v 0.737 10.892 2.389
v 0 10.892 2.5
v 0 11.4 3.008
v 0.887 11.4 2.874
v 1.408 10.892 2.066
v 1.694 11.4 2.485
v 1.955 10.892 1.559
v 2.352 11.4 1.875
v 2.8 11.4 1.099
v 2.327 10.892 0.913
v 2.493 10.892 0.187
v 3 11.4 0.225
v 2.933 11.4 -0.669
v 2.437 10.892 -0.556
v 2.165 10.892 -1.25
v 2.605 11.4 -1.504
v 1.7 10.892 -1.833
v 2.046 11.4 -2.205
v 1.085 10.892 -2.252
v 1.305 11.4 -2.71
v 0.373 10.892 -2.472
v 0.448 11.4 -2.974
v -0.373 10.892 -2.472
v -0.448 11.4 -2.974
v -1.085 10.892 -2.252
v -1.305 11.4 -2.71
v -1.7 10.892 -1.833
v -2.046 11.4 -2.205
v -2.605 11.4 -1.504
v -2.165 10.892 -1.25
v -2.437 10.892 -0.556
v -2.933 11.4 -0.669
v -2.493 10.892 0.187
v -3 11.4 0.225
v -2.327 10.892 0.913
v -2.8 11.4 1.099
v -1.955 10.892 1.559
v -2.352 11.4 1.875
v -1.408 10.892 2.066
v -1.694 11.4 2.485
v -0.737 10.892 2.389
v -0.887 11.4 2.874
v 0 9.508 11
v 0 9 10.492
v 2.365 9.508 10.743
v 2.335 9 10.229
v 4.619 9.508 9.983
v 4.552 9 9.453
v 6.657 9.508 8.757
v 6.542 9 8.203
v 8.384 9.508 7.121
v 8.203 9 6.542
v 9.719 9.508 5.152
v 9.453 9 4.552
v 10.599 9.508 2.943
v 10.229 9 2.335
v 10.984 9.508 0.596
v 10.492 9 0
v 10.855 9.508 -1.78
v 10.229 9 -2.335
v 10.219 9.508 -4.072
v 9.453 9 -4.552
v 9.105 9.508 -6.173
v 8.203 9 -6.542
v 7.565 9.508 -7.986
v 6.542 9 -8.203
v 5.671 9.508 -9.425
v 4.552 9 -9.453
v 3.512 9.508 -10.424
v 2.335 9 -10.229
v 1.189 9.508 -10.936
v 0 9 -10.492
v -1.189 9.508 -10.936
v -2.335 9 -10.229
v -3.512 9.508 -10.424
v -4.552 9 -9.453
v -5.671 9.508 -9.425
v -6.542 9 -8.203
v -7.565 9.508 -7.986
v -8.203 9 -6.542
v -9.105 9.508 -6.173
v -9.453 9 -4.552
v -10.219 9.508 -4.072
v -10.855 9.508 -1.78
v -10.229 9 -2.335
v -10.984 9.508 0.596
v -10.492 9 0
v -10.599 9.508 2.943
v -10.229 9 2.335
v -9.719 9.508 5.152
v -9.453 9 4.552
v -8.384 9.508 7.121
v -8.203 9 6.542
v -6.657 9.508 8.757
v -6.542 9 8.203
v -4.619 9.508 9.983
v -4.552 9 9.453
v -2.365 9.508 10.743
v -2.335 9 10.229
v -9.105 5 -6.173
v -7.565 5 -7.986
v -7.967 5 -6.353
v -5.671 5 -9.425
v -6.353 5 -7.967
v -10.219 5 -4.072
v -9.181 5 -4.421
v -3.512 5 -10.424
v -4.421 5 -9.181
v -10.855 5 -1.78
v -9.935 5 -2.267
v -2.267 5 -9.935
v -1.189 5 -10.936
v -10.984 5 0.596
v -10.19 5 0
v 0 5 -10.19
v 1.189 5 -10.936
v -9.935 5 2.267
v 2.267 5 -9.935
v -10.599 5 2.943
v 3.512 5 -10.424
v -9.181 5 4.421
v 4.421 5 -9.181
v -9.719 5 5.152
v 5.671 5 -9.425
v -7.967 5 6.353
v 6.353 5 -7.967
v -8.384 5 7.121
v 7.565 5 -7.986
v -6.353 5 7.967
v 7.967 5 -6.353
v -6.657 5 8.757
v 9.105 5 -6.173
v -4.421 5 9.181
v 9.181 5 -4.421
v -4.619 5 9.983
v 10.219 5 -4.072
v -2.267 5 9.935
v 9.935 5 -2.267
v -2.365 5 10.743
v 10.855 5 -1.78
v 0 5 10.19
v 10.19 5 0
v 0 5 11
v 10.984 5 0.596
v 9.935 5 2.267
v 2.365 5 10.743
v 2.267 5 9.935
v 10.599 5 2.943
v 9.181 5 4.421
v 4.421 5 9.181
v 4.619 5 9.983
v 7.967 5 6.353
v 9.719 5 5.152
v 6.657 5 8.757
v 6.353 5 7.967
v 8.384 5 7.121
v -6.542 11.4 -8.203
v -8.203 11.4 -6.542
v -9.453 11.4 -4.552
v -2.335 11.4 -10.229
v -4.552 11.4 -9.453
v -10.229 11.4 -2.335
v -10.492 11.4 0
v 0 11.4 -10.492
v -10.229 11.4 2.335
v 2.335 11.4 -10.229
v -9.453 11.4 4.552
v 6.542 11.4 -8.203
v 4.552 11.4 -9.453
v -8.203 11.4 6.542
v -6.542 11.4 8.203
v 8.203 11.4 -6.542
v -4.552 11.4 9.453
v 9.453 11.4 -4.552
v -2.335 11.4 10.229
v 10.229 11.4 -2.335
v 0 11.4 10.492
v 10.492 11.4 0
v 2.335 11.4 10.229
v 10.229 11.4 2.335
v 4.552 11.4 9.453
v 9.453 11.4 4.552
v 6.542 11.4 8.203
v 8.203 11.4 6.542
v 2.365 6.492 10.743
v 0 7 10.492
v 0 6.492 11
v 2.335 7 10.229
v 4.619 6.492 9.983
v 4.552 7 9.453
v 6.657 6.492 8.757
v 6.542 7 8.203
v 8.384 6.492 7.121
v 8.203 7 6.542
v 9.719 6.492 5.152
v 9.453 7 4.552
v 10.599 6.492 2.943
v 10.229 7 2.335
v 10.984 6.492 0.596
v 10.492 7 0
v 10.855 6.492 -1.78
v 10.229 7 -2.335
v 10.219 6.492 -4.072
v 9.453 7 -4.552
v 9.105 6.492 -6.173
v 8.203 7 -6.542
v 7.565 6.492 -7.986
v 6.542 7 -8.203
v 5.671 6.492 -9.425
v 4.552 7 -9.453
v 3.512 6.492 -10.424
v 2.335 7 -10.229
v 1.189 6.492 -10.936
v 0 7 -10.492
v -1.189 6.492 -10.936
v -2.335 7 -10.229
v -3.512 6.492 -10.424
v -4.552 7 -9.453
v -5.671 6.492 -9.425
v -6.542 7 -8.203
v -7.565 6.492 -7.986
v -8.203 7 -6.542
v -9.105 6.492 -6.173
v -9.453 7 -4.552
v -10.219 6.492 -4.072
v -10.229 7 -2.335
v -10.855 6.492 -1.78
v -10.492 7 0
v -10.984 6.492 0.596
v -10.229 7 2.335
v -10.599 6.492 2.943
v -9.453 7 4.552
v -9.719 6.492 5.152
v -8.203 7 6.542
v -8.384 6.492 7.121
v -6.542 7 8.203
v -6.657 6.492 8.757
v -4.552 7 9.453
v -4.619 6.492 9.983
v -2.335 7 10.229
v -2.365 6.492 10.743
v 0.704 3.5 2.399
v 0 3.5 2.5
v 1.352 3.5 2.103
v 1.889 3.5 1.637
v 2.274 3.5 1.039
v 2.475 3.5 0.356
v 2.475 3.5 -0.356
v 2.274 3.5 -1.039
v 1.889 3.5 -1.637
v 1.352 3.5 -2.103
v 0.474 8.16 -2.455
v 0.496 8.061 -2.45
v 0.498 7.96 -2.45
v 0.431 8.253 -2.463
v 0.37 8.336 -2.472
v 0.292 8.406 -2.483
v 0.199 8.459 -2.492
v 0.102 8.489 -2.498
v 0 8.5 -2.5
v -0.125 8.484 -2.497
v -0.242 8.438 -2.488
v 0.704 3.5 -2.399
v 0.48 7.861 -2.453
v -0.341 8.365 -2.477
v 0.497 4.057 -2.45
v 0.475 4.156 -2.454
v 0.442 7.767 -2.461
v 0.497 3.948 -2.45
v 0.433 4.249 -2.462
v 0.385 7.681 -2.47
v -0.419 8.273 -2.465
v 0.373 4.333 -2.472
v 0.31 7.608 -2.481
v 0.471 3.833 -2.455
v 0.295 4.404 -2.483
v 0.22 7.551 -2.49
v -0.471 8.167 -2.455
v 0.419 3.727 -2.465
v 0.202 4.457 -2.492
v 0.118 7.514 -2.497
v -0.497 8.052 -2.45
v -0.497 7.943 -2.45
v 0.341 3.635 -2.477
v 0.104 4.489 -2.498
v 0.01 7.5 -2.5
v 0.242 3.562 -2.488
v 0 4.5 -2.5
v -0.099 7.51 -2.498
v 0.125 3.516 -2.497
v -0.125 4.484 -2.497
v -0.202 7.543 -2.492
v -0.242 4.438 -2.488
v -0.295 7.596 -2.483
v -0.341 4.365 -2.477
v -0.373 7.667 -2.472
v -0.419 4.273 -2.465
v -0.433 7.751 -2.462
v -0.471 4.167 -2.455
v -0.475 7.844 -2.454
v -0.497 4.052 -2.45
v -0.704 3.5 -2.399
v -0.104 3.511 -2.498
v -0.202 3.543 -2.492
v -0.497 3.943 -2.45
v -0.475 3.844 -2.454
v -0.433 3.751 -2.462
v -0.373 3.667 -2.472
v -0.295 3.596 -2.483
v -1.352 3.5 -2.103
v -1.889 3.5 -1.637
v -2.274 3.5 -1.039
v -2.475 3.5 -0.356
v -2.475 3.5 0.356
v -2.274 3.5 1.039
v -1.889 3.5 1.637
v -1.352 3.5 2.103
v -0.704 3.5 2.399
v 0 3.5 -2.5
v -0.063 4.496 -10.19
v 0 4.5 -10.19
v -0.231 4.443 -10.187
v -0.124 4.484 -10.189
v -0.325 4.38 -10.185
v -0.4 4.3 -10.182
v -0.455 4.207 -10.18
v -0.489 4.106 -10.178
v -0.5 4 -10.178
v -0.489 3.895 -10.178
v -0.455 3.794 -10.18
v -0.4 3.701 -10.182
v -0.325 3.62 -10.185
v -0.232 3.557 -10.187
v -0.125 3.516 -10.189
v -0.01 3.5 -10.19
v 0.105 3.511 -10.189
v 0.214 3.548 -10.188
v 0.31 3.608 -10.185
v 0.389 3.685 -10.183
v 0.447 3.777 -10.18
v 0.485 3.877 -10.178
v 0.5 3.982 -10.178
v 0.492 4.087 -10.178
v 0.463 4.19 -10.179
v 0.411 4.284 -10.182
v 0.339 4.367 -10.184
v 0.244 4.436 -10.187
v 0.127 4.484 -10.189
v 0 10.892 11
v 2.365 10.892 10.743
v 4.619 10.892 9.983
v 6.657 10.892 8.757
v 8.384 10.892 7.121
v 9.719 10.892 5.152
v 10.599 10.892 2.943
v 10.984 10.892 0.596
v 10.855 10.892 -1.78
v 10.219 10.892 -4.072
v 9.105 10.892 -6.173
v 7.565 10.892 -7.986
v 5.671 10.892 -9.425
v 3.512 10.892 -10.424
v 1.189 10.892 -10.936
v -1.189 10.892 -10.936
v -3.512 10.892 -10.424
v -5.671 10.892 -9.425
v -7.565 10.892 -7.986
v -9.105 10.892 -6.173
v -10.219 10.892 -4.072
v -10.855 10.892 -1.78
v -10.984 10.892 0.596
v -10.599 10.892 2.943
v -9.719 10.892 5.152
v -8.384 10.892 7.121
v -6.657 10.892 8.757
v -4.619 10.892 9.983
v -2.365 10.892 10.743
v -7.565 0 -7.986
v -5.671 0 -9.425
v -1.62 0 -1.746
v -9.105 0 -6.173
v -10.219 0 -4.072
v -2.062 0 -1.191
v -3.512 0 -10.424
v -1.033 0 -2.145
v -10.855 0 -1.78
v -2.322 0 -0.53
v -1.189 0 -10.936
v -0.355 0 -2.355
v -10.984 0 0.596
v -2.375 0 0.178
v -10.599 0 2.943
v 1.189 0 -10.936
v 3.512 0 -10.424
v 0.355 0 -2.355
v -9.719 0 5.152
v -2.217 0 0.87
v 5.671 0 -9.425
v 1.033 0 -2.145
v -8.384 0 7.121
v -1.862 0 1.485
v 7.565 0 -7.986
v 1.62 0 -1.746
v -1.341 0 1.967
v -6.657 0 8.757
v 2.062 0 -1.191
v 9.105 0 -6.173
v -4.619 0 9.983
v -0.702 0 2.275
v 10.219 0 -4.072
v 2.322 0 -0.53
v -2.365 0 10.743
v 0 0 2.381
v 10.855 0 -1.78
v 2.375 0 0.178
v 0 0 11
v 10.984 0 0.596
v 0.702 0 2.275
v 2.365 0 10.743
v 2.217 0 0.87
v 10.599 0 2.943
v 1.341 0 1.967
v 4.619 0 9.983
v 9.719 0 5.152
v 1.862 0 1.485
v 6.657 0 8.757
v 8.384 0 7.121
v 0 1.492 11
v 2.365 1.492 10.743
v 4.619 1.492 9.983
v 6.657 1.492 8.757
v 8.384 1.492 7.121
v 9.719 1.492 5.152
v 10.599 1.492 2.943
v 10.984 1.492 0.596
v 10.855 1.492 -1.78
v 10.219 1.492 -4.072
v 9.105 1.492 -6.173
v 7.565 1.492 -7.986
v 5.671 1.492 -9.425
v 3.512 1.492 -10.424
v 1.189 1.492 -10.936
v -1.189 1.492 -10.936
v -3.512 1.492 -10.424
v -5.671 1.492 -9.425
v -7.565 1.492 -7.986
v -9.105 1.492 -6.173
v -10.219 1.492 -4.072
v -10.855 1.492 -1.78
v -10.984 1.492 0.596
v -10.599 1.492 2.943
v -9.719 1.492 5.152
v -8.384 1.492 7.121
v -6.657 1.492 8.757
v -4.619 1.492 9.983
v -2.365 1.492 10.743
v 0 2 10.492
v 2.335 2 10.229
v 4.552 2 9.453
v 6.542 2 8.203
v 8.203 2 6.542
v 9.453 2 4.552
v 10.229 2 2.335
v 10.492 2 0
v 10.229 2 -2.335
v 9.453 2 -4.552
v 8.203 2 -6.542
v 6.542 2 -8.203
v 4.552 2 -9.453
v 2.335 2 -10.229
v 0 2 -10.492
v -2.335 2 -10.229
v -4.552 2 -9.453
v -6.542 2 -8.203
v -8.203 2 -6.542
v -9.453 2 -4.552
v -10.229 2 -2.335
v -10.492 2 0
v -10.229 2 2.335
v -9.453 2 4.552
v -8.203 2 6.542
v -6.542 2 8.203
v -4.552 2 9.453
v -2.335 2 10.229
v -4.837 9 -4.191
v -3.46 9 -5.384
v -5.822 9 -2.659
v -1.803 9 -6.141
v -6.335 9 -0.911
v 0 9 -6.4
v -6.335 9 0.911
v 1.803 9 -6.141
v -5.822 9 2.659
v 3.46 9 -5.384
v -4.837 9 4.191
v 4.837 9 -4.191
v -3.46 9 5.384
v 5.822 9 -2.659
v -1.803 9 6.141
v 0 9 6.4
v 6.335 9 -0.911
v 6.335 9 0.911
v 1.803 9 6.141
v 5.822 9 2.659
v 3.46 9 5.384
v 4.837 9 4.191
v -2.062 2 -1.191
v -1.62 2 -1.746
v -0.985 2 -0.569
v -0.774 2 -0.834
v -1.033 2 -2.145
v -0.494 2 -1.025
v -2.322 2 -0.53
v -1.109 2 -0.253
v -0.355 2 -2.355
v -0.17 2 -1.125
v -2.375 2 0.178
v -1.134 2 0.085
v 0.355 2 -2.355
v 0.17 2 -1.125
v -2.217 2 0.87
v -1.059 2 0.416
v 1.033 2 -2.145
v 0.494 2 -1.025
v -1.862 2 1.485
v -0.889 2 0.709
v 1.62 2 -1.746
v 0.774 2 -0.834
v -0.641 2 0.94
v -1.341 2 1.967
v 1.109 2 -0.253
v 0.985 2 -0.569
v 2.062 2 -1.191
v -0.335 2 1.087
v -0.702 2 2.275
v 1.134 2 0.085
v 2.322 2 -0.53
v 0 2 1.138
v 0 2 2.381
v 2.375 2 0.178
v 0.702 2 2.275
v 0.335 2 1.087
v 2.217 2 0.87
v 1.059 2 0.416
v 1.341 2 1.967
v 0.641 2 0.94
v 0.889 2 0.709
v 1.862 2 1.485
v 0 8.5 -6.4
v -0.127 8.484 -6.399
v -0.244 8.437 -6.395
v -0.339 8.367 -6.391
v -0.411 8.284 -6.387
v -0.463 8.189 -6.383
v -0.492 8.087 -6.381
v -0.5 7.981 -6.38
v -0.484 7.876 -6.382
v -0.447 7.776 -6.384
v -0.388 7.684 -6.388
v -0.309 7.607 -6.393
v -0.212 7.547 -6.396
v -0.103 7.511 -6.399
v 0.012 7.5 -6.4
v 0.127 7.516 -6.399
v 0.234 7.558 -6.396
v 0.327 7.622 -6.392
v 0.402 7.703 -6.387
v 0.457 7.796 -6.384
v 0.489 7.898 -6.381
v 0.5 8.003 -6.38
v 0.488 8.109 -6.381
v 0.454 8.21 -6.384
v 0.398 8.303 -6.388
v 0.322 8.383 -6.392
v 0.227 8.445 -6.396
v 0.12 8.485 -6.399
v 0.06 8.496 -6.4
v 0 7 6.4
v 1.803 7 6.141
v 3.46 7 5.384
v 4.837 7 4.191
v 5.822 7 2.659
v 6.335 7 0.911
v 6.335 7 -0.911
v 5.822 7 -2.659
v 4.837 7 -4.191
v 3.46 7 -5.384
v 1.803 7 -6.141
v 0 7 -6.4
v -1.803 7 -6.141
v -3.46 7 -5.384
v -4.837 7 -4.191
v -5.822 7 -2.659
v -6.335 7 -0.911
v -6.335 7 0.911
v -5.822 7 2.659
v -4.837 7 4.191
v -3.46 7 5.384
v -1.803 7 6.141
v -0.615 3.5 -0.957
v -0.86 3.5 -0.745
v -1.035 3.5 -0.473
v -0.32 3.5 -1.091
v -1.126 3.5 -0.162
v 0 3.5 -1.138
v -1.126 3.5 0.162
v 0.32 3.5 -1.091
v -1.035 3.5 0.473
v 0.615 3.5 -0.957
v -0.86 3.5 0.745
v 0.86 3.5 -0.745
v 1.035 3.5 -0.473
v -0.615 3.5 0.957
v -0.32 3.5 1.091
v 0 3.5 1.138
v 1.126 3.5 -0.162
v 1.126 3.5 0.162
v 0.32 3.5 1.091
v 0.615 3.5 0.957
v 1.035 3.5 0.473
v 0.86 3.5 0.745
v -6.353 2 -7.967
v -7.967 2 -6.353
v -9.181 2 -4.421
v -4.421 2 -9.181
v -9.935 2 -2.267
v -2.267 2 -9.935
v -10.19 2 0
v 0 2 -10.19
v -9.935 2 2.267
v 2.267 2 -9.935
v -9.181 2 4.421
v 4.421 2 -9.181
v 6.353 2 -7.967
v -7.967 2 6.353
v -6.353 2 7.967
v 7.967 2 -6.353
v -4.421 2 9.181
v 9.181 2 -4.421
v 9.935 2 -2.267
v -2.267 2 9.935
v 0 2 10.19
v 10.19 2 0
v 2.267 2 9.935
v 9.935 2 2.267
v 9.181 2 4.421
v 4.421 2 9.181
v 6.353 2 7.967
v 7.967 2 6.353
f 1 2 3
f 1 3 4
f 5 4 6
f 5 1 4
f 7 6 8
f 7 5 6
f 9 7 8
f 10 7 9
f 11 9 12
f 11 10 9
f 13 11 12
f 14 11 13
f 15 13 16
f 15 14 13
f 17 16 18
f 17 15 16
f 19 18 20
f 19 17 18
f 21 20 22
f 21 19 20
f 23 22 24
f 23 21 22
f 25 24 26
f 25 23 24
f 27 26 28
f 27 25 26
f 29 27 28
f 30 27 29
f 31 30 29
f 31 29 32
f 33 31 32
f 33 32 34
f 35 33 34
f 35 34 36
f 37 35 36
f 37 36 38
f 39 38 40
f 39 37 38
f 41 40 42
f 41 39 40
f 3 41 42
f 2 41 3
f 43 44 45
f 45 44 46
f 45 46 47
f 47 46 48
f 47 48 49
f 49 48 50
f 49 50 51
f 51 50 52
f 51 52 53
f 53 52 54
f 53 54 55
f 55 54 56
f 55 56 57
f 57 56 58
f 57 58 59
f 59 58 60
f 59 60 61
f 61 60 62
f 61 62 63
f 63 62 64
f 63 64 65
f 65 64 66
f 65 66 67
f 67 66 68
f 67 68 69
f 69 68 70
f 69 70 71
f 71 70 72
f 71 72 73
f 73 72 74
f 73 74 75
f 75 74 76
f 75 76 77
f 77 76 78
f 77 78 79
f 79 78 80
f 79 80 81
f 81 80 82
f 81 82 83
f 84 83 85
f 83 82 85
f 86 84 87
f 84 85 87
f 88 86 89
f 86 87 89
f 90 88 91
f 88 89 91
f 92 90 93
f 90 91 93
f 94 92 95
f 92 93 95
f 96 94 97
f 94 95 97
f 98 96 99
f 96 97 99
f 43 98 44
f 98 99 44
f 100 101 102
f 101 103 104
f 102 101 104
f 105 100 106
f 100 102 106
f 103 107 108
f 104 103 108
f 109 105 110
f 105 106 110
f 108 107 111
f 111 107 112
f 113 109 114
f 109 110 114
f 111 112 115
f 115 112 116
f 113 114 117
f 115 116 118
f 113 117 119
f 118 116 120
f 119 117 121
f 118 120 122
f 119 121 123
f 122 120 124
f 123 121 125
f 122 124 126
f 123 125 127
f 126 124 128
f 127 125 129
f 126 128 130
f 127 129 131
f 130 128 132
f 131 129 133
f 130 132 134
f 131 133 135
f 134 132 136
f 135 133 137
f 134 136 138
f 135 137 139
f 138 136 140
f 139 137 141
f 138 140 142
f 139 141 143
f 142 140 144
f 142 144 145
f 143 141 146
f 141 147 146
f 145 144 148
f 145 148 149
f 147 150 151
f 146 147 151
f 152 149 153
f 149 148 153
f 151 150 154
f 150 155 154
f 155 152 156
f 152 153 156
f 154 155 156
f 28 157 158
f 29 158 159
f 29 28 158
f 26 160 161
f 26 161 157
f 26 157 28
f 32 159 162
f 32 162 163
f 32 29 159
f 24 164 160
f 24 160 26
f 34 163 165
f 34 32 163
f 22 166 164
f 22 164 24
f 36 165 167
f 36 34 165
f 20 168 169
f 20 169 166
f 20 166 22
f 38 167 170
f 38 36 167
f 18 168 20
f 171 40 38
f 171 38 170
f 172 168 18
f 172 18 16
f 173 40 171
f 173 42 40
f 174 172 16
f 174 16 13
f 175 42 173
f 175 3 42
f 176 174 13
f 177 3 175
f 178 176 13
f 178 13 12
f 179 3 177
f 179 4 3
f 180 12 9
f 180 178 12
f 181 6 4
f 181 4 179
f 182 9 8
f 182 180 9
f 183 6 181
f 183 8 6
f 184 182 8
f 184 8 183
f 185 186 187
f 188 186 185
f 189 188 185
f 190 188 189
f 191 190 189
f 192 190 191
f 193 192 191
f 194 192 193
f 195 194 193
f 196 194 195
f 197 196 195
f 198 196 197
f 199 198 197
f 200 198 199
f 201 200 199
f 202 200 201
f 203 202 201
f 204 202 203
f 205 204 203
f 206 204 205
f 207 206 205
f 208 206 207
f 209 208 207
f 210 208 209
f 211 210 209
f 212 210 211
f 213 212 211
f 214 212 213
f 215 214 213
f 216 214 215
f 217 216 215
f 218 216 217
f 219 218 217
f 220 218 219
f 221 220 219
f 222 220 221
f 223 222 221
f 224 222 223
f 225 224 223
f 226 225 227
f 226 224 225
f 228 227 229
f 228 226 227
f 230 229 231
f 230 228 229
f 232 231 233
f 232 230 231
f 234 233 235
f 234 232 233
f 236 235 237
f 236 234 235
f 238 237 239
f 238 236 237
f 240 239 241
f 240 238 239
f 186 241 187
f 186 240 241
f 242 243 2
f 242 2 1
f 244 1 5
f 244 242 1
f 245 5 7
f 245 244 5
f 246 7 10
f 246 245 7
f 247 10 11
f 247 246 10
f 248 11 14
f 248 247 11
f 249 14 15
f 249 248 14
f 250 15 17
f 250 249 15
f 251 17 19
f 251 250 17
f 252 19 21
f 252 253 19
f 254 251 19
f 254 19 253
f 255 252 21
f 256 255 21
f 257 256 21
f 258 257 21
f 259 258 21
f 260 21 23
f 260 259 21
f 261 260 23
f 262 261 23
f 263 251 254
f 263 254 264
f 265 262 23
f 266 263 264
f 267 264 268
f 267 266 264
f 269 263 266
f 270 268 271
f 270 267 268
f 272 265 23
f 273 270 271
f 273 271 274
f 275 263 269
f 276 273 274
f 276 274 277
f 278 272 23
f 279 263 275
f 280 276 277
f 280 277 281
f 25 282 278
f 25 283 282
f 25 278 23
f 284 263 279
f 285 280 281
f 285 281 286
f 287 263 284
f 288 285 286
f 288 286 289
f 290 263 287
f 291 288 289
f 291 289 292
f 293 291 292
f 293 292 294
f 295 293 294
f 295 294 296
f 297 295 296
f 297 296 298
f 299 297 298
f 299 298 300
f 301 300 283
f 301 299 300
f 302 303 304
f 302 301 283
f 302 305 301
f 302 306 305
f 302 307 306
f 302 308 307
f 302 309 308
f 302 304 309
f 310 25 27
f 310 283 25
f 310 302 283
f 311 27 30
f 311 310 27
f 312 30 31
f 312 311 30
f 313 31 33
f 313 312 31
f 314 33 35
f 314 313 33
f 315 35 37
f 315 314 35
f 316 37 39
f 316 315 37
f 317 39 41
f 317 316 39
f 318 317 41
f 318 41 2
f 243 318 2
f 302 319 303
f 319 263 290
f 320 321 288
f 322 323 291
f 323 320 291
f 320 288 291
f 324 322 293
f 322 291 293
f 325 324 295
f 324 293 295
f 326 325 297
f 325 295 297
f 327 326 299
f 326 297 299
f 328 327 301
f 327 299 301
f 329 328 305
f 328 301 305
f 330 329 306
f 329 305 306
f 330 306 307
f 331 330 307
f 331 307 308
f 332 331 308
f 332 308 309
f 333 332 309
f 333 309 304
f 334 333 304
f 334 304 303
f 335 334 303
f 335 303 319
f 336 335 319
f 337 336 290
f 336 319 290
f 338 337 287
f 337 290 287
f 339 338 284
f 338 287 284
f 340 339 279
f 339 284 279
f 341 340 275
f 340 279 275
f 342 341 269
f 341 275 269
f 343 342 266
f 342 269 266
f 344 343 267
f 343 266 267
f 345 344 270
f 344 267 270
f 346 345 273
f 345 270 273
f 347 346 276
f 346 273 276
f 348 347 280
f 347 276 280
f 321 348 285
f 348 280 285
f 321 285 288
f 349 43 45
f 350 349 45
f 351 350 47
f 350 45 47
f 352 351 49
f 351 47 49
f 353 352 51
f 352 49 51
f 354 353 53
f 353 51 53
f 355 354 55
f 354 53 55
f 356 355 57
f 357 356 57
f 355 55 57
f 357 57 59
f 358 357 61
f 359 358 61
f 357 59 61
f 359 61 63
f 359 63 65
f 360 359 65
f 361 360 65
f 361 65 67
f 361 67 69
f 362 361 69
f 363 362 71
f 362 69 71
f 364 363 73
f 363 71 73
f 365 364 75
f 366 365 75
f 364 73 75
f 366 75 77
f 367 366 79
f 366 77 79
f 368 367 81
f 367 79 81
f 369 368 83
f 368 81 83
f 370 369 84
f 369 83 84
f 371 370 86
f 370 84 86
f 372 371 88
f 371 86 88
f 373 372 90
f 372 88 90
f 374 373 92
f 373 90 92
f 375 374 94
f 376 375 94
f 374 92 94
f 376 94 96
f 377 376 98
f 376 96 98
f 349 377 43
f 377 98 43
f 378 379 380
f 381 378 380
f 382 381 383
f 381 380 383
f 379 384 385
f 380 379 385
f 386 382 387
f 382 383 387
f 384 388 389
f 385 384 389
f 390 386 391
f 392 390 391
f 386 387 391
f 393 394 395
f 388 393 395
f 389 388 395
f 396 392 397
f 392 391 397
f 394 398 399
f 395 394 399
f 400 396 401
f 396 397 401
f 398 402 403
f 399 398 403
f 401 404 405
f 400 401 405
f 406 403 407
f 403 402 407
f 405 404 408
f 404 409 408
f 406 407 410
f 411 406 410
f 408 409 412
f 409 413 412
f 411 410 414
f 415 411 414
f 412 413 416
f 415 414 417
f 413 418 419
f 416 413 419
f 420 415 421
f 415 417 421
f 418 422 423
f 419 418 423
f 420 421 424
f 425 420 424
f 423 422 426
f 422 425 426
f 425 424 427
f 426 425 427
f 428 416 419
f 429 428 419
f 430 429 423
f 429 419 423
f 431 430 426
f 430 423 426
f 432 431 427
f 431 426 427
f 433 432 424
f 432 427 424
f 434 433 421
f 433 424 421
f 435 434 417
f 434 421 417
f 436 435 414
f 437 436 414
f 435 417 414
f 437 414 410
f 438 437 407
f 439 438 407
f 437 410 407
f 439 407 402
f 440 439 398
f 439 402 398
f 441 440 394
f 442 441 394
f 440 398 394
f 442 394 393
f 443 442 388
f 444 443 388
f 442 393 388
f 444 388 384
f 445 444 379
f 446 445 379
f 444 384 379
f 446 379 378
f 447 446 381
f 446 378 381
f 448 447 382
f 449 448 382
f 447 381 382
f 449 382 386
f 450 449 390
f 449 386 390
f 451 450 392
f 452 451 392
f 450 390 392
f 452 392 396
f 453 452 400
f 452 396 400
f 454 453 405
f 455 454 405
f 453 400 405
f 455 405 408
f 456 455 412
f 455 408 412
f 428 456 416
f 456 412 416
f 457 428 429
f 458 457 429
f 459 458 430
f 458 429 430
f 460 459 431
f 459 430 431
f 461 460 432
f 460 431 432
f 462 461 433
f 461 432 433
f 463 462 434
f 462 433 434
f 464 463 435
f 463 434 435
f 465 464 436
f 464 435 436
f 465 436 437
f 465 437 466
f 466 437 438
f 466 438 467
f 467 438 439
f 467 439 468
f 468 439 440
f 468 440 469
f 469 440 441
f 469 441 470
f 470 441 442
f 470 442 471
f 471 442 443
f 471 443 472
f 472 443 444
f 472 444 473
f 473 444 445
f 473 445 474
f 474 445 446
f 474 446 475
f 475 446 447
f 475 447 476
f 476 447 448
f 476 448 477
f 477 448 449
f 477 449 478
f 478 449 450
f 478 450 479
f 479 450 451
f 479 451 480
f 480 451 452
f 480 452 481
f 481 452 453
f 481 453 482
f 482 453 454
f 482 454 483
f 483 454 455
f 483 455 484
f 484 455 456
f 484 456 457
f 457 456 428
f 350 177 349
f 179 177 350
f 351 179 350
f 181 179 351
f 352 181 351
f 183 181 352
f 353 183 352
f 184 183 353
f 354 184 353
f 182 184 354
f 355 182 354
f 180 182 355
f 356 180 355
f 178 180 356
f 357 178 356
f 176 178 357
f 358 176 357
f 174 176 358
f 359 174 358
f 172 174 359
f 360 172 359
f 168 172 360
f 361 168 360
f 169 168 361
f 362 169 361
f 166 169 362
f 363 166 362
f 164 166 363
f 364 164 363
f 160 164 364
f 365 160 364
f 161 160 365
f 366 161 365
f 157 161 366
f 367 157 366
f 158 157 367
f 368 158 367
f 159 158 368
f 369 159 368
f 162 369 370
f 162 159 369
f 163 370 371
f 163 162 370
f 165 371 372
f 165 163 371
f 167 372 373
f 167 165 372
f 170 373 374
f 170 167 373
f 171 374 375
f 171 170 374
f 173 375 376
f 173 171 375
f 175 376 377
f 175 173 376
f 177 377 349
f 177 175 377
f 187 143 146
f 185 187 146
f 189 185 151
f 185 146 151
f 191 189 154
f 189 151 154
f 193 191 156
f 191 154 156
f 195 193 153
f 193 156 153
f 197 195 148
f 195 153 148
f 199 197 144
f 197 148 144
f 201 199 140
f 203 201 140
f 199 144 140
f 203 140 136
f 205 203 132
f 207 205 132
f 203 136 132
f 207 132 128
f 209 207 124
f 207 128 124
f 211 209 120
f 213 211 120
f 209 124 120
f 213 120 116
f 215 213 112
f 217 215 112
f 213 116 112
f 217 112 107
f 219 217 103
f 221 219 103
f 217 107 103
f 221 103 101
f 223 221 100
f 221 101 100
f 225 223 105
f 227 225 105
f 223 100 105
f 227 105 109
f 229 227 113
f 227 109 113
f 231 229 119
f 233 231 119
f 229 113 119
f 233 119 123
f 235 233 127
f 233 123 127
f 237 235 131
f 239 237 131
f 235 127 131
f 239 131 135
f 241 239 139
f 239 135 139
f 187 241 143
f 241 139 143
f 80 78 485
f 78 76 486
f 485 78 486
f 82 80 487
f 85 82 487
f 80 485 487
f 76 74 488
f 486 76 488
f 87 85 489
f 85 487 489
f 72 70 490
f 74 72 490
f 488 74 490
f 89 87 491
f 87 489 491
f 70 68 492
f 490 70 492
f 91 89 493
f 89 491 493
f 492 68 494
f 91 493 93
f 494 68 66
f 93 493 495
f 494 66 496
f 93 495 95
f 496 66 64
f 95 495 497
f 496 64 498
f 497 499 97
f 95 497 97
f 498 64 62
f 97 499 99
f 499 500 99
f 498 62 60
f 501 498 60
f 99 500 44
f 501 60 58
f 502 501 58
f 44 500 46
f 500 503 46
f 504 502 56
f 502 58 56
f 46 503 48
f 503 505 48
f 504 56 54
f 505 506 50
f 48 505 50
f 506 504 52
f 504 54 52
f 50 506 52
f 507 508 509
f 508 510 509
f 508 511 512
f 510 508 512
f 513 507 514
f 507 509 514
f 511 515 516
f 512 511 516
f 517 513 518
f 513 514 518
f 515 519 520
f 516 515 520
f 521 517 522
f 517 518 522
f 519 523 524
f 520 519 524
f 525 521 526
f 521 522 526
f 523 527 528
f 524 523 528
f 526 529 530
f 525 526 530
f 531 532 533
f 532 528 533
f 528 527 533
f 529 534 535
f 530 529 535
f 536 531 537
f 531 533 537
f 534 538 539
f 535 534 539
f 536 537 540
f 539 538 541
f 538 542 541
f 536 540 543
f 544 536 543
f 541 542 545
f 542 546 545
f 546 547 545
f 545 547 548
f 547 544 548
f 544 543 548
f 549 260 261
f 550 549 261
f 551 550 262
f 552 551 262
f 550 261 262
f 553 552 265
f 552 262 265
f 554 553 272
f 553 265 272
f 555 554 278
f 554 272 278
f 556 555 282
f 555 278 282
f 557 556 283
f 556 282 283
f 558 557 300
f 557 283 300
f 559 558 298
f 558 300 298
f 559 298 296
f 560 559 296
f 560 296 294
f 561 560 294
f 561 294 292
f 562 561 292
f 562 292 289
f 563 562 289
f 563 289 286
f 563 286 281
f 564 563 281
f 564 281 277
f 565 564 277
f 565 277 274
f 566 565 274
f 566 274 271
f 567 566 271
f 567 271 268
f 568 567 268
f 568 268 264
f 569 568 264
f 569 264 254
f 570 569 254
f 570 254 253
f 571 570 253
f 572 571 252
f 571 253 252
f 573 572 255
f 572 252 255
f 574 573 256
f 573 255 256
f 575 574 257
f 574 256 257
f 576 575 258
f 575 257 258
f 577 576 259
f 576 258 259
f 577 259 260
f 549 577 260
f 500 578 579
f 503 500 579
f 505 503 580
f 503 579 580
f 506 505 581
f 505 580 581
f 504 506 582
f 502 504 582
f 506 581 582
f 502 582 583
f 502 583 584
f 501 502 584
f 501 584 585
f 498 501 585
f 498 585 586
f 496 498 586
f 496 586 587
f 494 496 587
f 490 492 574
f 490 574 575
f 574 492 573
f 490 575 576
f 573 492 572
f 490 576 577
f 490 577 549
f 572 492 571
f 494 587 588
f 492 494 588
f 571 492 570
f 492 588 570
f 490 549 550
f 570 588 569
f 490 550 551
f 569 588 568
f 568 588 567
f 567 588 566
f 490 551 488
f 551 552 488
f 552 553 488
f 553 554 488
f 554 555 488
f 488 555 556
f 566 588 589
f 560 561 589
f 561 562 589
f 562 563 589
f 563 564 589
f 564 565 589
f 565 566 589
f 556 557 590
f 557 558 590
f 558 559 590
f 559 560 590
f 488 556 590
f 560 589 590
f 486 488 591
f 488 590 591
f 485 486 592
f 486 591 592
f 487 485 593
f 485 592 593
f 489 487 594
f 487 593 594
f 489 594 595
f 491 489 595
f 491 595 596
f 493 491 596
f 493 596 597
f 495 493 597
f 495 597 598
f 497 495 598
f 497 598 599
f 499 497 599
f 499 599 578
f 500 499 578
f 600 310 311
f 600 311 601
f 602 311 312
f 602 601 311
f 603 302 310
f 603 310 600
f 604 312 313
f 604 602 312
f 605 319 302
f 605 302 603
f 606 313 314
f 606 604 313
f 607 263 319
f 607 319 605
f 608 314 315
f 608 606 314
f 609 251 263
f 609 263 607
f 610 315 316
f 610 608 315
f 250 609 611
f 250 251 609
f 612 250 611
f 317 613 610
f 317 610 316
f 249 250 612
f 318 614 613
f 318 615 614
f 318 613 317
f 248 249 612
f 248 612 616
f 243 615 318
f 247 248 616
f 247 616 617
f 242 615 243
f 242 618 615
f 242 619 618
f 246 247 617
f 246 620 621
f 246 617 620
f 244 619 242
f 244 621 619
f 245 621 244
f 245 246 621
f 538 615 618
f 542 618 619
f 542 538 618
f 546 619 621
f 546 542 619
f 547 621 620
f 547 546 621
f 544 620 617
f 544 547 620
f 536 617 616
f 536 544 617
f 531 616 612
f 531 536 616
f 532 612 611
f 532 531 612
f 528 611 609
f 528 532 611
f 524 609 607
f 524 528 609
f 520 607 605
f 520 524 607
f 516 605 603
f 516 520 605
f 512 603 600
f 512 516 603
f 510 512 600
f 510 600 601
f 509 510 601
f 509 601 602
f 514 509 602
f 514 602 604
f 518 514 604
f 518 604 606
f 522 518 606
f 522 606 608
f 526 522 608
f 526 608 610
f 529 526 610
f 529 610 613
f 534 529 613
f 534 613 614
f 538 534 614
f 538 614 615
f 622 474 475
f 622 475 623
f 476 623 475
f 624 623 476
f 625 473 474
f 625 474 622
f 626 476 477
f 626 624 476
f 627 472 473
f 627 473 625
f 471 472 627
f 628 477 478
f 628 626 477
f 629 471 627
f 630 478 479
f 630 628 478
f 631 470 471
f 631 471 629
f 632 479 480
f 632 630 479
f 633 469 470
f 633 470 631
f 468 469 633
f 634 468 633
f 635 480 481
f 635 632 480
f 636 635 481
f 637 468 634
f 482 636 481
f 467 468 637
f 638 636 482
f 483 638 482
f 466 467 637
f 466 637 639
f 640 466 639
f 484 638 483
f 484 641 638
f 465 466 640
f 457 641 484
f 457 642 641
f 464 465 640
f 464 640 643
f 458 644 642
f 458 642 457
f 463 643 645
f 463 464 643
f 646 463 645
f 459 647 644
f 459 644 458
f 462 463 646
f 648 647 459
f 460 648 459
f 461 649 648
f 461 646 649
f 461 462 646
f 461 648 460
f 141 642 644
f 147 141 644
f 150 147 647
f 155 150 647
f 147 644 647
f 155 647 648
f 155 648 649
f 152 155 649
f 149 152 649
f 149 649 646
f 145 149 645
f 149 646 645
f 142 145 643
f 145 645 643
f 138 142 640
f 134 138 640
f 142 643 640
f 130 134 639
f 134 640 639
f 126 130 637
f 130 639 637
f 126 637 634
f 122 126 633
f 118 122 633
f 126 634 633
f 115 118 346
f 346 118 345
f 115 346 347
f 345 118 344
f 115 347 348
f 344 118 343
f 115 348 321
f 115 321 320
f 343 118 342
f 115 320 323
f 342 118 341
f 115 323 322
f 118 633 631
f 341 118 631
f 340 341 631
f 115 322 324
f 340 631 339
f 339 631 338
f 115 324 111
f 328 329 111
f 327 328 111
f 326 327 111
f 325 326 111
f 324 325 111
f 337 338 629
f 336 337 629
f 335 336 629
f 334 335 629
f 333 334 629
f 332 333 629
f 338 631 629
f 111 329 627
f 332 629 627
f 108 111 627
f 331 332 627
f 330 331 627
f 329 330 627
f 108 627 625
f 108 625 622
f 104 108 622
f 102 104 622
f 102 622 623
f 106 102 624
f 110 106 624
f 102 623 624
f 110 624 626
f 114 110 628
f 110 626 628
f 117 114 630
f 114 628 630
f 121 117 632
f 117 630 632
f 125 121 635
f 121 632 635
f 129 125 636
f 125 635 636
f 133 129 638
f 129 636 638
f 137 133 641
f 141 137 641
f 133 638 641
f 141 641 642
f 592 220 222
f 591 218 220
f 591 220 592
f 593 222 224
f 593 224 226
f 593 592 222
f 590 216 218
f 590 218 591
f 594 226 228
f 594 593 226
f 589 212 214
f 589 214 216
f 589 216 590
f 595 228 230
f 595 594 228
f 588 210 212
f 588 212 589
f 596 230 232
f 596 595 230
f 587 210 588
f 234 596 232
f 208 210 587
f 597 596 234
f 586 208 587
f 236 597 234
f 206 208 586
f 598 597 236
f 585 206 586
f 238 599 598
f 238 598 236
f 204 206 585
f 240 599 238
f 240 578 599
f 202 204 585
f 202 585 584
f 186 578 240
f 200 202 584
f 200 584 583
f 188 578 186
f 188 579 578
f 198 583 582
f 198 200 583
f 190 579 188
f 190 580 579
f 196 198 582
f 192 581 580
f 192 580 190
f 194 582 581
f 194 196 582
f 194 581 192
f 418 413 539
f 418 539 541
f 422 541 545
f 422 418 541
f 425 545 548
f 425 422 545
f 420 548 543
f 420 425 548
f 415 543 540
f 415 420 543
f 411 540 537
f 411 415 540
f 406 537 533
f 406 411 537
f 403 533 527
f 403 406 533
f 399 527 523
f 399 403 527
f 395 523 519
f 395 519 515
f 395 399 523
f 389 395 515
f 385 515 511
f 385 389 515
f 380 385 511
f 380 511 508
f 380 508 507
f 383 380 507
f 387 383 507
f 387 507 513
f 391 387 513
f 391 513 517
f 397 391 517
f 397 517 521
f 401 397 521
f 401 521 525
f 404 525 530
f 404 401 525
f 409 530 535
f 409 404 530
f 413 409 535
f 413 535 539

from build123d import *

# Parameters (mm, degrees)
SKETCH1_R           = 11
SKETCH1_R_2         = 2.38125
BOSS_EXTRUDE1_DEPTH = 2
SKETCH2_R           = 10.19
SKETCH2_R_2         = 1.1375
BOSS_EXTRUDE2_DEPTH = 1.5
SKETCH3_R           = 10.19
SKETCH3_R_2         = 2.5
BOSS_EXTRUDE3_DEPTH = 1.5
SKETCH5_R           = 11
SKETCH5_R_2         = 2.5
BOSS_EXTRUDE4_DEPTH = 2
SKETCH6_R           = 6.4
SKETCH6_R_2         = 2.5
BOSS_EXTRUDE5_DEPTH = 2
SKETCH7_R           = 11
SKETCH7_R_2         = 2.5
BOSS_EXTRUDE6_DEPTH = 2.4
SKETCH8_R           = 0.5
CUT_EXTRUDE1_DEPTH  = 20.286264542
CHAMFER1_SIZE       = 0.508


with BuildPart() as part:
    # Sketch1 → Boss-Extrude1 (new body)
    with BuildSketch(Plane(origin=(0, 0, 0), x_dir=(1, 0, 0), z_dir=(0, 1, 0))):
        with Locations(Location((0, 0, 0), (0, 0, 270))):
            Circle(SKETCH1_R)
        with Locations(Location((0, 0, 0), (0, 0, 270))):
            Circle(SKETCH1_R_2, mode=Mode.SUBTRACT)
    extrude(amount=BOSS_EXTRUDE1_DEPTH)

    # Sketch2 → Boss-Extrude2 (add)
    with BuildSketch(Plane(origin=(0, 2, 0), x_dir=(1, 0, 0), z_dir=(0, 1, 0))):
        with Locations(Location((0, 0, 0), (0, 0, 270))):
            Circle(SKETCH2_R)
        with Locations(Location((0, 0, 0), (0, 0, 270))):
            Circle(SKETCH2_R_2, mode=Mode.SUBTRACT)
    extrude(amount=BOSS_EXTRUDE2_DEPTH)

    # Sketch3 → Boss-Extrude3 (add)
    with BuildSketch(Plane(origin=(0, 3.5, 0), x_dir=(1, 0, 0), z_dir=(0, 1, 0))):
        with Locations(Location((0, 0, 0), (0, 0, 270))):
            Circle(SKETCH3_R)
        with Locations(Location((0, 0, 0), (0, 0, 270))):
            Circle(SKETCH3_R_2, mode=Mode.SUBTRACT)
    extrude(amount=BOSS_EXTRUDE3_DEPTH)

    # Sketch5 → Boss-Extrude4 (add)
    with BuildSketch(Plane(origin=(0, 5, 0), x_dir=(1, 0, 0), z_dir=(0, 1, 0))):
        with Locations(Location((0, 0, 0), (0, 0, 270))):
            Circle(SKETCH5_R)
        with Locations(Location((0, 0, 0), (0, 0, 270))):
            Circle(SKETCH5_R_2, mode=Mode.SUBTRACT)
    extrude(amount=BOSS_EXTRUDE4_DEPTH)

    # Sketch6 → Boss-Extrude5 (add)
    with BuildSketch(Plane(origin=(0, 7, 0), x_dir=(1, 0, 0), z_dir=(0, 1, 0))):
        with Locations(Location((0, 0, 0), (0, 0, 270))):
            Circle(SKETCH6_R)
        with Locations(Location((0, 0, 0), (0, 0, 270))):
            Circle(SKETCH6_R_2, mode=Mode.SUBTRACT)
    extrude(amount=BOSS_EXTRUDE5_DEPTH)

    # Sketch7 → Boss-Extrude6 (add)
    with BuildSketch(Plane(origin=(0, 9, 0), x_dir=(1, 0, 0), z_dir=(0, 1, 0))):
        with Locations(Location((0, 0, 0), (0, 0, 270))):
            Circle(SKETCH7_R)
        with Locations(Location((0, 0, 0), (0, 0, 270))):
            Circle(SKETCH7_R_2, mode=Mode.SUBTRACT)
    extrude(amount=BOSS_EXTRUDE6_DEPTH)

    # Sketch8 → Cut-Extrude1 (cut, through all)
    with BuildSketch(Plane.XY):
        with Locations(Location((0, 8, 0), (0, 0, 90))):
            Circle(SKETCH8_R)
        with Locations(Location((0, 4, 0), (0, 0, 89.999999996))):
            Circle(SKETCH8_R)
    extrude(amount=-CUT_EXTRUDE1_DEPTH, mode=Mode.SUBTRACT)

    # Chamfer1
    chamfer1_edges = [part.edges().sort_by_distance(p)[0] for p in [
        (0, 7, -11),
        (0, 11.4, -11),
        (0, 9, -11),
        (0, 11.4, -2.5),
        (0, 2, -11),
    ]]
    chamfer(chamfer1_edges, length=CHAMFER1_SIZE)


solid = part.part
